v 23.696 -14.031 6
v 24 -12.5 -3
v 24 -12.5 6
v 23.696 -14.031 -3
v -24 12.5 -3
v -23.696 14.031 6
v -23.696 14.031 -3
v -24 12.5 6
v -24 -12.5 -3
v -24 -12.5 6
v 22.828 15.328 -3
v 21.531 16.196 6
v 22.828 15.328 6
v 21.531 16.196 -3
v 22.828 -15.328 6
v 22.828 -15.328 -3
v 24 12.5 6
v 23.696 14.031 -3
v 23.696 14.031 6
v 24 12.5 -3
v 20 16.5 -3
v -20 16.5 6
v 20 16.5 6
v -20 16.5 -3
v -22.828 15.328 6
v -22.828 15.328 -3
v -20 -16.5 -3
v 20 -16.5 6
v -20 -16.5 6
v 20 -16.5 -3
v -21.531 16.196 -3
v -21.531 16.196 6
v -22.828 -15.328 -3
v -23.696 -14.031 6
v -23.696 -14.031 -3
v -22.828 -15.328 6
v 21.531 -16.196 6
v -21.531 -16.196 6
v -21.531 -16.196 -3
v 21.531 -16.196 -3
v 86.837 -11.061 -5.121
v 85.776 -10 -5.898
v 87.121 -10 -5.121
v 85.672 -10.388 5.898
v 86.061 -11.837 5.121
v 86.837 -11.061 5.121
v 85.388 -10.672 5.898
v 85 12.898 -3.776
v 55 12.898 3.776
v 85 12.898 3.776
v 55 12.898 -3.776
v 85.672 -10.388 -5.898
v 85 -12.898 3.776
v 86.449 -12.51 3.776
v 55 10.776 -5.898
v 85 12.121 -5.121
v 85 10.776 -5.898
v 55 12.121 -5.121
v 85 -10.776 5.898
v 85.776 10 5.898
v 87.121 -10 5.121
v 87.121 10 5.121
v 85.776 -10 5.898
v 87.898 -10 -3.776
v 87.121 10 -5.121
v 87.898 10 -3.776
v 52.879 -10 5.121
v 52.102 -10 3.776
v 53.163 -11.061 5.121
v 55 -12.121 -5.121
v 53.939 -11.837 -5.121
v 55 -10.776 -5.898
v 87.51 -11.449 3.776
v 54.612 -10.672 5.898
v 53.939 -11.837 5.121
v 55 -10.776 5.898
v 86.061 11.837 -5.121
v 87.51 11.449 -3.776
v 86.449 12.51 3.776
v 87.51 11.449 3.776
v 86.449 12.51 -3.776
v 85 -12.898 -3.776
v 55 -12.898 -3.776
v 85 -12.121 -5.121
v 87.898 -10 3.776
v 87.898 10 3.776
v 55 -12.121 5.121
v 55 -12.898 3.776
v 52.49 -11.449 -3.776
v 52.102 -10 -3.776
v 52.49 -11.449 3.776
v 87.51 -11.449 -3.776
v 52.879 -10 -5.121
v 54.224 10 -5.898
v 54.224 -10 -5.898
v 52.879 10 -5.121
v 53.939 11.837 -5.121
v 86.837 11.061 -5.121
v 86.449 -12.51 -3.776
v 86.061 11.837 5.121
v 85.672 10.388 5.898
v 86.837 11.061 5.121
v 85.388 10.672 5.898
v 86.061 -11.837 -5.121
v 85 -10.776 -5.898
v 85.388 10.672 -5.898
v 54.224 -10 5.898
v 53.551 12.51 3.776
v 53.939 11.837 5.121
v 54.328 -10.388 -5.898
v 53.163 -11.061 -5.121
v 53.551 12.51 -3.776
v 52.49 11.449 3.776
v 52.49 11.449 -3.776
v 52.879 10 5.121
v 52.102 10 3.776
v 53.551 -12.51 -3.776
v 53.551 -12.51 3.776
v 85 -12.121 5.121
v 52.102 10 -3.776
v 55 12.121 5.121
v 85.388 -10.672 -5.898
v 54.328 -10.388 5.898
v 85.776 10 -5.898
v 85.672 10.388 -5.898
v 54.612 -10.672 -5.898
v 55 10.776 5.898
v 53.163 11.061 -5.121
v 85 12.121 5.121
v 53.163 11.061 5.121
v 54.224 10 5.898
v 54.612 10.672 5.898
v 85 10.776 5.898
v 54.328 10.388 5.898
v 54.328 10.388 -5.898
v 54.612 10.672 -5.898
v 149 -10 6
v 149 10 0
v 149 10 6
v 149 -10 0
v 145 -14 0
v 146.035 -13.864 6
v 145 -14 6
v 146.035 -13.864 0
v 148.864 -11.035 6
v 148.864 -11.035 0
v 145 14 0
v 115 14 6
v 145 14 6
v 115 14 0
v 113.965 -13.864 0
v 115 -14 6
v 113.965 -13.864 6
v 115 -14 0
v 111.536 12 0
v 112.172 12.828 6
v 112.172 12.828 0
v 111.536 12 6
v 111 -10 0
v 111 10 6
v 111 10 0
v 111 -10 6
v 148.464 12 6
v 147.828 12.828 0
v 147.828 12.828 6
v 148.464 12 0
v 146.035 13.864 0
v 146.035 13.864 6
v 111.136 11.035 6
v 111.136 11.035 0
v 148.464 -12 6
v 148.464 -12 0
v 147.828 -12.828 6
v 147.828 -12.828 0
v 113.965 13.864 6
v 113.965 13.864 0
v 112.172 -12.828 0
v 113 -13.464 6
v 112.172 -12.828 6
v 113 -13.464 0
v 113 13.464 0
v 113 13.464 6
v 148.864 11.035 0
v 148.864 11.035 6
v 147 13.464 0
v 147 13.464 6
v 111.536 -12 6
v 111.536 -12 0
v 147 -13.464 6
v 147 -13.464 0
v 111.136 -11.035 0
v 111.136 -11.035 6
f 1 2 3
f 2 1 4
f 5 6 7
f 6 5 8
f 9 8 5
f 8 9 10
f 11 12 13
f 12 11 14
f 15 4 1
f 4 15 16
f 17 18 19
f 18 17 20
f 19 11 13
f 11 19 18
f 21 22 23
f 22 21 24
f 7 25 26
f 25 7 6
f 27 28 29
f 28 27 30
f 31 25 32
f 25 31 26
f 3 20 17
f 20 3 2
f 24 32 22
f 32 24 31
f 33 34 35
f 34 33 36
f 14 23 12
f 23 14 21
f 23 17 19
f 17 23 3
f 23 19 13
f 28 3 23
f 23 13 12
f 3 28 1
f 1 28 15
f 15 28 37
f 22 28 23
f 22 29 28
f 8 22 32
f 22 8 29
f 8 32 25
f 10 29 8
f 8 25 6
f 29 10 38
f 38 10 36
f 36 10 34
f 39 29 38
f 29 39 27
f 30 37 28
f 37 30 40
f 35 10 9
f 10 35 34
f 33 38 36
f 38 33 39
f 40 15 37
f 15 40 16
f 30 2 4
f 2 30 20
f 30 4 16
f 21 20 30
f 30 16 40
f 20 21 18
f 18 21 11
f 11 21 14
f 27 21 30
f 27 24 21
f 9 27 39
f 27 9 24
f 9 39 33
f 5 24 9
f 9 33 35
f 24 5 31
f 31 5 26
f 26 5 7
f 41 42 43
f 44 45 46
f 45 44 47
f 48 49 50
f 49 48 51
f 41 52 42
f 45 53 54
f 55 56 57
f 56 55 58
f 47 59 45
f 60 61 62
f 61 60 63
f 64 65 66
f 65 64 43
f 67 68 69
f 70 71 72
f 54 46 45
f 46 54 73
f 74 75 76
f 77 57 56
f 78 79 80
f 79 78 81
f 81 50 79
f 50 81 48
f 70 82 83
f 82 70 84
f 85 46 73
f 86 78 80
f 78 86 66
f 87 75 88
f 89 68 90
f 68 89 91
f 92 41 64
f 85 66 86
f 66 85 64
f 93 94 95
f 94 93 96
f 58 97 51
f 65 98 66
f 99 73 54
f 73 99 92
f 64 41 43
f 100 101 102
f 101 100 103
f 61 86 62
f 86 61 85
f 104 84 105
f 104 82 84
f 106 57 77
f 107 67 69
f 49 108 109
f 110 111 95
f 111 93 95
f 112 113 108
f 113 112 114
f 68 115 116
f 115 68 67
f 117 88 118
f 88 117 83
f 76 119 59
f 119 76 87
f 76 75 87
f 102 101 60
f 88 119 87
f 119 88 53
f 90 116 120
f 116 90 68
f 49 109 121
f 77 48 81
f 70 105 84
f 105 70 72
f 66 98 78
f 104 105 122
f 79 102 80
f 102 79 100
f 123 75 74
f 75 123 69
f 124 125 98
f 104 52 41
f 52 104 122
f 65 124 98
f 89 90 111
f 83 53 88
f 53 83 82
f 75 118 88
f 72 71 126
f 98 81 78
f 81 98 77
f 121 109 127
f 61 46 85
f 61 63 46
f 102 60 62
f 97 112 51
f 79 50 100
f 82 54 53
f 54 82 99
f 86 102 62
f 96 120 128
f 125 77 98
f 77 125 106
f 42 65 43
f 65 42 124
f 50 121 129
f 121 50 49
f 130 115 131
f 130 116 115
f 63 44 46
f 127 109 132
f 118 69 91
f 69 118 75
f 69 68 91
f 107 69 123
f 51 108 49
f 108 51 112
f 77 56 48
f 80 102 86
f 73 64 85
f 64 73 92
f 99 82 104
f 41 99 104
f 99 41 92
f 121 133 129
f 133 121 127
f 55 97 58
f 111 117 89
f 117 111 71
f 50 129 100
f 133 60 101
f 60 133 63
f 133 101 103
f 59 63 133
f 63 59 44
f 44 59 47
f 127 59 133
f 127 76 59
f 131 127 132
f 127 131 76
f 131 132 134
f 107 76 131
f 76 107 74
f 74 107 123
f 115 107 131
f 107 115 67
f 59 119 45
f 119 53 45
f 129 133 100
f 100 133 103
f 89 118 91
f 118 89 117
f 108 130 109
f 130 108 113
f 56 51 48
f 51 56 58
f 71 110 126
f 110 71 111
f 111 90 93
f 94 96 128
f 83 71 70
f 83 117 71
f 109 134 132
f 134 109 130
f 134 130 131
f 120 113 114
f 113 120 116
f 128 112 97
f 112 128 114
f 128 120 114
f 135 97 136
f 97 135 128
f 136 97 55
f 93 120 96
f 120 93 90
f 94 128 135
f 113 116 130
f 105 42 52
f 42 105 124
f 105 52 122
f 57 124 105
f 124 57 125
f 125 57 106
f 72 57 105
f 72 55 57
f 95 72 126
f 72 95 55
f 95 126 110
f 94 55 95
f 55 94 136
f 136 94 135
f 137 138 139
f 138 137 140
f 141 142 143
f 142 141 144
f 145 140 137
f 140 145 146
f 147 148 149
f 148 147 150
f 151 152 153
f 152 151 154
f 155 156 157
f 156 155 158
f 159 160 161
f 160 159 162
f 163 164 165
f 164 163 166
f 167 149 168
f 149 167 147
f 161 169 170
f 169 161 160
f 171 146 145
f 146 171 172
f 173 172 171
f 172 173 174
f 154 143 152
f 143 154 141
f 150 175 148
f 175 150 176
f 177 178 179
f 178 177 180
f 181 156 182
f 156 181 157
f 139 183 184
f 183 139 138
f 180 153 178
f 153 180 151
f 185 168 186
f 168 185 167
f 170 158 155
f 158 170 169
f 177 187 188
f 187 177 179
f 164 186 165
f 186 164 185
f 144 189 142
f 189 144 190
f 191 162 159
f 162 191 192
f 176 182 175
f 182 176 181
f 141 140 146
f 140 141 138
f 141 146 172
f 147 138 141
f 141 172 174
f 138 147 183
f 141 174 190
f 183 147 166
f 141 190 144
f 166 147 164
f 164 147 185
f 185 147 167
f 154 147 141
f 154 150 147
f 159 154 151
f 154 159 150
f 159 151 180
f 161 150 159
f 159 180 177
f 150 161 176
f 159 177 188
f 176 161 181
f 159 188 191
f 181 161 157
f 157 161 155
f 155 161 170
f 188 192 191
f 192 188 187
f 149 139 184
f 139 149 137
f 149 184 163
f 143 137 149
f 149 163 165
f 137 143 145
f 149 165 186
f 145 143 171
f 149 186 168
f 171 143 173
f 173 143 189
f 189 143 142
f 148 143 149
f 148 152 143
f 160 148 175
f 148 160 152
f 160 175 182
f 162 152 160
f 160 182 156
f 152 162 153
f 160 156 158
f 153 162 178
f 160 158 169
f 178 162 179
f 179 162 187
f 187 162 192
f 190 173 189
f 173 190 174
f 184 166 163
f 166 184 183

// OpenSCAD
// minkowski(): sweep one shape over another.
//
// The usual reason is rounding an edge, and the usual mistake is a
// costly one: the work grows with the facet count of BOTH shapes, so
// keep $fn low on the sweeping shape.

// A plate with its top and side edges rounded, by sweeping a small
// cylinder over a slab.
minkowski() {
    cube([40, 25, 6], center=true);
    cylinder(h=3, r=4, $fn=16);
}

// Sweeping a sphere rounds every edge at once, and costs the most.
translate([70, 0, 0])
    minkowski() {
        cube([30, 20, 6], center=true);
        sphere(3, $fn=12);
    }

// For a 2D outline, offset() does the same job in one cheap step --
// prefer it over minkowski() with a circle.
translate([130, 0, 0]) linear_extrude(6)
    offset(r=4, $fn=24) square([30, 20], center=true);
